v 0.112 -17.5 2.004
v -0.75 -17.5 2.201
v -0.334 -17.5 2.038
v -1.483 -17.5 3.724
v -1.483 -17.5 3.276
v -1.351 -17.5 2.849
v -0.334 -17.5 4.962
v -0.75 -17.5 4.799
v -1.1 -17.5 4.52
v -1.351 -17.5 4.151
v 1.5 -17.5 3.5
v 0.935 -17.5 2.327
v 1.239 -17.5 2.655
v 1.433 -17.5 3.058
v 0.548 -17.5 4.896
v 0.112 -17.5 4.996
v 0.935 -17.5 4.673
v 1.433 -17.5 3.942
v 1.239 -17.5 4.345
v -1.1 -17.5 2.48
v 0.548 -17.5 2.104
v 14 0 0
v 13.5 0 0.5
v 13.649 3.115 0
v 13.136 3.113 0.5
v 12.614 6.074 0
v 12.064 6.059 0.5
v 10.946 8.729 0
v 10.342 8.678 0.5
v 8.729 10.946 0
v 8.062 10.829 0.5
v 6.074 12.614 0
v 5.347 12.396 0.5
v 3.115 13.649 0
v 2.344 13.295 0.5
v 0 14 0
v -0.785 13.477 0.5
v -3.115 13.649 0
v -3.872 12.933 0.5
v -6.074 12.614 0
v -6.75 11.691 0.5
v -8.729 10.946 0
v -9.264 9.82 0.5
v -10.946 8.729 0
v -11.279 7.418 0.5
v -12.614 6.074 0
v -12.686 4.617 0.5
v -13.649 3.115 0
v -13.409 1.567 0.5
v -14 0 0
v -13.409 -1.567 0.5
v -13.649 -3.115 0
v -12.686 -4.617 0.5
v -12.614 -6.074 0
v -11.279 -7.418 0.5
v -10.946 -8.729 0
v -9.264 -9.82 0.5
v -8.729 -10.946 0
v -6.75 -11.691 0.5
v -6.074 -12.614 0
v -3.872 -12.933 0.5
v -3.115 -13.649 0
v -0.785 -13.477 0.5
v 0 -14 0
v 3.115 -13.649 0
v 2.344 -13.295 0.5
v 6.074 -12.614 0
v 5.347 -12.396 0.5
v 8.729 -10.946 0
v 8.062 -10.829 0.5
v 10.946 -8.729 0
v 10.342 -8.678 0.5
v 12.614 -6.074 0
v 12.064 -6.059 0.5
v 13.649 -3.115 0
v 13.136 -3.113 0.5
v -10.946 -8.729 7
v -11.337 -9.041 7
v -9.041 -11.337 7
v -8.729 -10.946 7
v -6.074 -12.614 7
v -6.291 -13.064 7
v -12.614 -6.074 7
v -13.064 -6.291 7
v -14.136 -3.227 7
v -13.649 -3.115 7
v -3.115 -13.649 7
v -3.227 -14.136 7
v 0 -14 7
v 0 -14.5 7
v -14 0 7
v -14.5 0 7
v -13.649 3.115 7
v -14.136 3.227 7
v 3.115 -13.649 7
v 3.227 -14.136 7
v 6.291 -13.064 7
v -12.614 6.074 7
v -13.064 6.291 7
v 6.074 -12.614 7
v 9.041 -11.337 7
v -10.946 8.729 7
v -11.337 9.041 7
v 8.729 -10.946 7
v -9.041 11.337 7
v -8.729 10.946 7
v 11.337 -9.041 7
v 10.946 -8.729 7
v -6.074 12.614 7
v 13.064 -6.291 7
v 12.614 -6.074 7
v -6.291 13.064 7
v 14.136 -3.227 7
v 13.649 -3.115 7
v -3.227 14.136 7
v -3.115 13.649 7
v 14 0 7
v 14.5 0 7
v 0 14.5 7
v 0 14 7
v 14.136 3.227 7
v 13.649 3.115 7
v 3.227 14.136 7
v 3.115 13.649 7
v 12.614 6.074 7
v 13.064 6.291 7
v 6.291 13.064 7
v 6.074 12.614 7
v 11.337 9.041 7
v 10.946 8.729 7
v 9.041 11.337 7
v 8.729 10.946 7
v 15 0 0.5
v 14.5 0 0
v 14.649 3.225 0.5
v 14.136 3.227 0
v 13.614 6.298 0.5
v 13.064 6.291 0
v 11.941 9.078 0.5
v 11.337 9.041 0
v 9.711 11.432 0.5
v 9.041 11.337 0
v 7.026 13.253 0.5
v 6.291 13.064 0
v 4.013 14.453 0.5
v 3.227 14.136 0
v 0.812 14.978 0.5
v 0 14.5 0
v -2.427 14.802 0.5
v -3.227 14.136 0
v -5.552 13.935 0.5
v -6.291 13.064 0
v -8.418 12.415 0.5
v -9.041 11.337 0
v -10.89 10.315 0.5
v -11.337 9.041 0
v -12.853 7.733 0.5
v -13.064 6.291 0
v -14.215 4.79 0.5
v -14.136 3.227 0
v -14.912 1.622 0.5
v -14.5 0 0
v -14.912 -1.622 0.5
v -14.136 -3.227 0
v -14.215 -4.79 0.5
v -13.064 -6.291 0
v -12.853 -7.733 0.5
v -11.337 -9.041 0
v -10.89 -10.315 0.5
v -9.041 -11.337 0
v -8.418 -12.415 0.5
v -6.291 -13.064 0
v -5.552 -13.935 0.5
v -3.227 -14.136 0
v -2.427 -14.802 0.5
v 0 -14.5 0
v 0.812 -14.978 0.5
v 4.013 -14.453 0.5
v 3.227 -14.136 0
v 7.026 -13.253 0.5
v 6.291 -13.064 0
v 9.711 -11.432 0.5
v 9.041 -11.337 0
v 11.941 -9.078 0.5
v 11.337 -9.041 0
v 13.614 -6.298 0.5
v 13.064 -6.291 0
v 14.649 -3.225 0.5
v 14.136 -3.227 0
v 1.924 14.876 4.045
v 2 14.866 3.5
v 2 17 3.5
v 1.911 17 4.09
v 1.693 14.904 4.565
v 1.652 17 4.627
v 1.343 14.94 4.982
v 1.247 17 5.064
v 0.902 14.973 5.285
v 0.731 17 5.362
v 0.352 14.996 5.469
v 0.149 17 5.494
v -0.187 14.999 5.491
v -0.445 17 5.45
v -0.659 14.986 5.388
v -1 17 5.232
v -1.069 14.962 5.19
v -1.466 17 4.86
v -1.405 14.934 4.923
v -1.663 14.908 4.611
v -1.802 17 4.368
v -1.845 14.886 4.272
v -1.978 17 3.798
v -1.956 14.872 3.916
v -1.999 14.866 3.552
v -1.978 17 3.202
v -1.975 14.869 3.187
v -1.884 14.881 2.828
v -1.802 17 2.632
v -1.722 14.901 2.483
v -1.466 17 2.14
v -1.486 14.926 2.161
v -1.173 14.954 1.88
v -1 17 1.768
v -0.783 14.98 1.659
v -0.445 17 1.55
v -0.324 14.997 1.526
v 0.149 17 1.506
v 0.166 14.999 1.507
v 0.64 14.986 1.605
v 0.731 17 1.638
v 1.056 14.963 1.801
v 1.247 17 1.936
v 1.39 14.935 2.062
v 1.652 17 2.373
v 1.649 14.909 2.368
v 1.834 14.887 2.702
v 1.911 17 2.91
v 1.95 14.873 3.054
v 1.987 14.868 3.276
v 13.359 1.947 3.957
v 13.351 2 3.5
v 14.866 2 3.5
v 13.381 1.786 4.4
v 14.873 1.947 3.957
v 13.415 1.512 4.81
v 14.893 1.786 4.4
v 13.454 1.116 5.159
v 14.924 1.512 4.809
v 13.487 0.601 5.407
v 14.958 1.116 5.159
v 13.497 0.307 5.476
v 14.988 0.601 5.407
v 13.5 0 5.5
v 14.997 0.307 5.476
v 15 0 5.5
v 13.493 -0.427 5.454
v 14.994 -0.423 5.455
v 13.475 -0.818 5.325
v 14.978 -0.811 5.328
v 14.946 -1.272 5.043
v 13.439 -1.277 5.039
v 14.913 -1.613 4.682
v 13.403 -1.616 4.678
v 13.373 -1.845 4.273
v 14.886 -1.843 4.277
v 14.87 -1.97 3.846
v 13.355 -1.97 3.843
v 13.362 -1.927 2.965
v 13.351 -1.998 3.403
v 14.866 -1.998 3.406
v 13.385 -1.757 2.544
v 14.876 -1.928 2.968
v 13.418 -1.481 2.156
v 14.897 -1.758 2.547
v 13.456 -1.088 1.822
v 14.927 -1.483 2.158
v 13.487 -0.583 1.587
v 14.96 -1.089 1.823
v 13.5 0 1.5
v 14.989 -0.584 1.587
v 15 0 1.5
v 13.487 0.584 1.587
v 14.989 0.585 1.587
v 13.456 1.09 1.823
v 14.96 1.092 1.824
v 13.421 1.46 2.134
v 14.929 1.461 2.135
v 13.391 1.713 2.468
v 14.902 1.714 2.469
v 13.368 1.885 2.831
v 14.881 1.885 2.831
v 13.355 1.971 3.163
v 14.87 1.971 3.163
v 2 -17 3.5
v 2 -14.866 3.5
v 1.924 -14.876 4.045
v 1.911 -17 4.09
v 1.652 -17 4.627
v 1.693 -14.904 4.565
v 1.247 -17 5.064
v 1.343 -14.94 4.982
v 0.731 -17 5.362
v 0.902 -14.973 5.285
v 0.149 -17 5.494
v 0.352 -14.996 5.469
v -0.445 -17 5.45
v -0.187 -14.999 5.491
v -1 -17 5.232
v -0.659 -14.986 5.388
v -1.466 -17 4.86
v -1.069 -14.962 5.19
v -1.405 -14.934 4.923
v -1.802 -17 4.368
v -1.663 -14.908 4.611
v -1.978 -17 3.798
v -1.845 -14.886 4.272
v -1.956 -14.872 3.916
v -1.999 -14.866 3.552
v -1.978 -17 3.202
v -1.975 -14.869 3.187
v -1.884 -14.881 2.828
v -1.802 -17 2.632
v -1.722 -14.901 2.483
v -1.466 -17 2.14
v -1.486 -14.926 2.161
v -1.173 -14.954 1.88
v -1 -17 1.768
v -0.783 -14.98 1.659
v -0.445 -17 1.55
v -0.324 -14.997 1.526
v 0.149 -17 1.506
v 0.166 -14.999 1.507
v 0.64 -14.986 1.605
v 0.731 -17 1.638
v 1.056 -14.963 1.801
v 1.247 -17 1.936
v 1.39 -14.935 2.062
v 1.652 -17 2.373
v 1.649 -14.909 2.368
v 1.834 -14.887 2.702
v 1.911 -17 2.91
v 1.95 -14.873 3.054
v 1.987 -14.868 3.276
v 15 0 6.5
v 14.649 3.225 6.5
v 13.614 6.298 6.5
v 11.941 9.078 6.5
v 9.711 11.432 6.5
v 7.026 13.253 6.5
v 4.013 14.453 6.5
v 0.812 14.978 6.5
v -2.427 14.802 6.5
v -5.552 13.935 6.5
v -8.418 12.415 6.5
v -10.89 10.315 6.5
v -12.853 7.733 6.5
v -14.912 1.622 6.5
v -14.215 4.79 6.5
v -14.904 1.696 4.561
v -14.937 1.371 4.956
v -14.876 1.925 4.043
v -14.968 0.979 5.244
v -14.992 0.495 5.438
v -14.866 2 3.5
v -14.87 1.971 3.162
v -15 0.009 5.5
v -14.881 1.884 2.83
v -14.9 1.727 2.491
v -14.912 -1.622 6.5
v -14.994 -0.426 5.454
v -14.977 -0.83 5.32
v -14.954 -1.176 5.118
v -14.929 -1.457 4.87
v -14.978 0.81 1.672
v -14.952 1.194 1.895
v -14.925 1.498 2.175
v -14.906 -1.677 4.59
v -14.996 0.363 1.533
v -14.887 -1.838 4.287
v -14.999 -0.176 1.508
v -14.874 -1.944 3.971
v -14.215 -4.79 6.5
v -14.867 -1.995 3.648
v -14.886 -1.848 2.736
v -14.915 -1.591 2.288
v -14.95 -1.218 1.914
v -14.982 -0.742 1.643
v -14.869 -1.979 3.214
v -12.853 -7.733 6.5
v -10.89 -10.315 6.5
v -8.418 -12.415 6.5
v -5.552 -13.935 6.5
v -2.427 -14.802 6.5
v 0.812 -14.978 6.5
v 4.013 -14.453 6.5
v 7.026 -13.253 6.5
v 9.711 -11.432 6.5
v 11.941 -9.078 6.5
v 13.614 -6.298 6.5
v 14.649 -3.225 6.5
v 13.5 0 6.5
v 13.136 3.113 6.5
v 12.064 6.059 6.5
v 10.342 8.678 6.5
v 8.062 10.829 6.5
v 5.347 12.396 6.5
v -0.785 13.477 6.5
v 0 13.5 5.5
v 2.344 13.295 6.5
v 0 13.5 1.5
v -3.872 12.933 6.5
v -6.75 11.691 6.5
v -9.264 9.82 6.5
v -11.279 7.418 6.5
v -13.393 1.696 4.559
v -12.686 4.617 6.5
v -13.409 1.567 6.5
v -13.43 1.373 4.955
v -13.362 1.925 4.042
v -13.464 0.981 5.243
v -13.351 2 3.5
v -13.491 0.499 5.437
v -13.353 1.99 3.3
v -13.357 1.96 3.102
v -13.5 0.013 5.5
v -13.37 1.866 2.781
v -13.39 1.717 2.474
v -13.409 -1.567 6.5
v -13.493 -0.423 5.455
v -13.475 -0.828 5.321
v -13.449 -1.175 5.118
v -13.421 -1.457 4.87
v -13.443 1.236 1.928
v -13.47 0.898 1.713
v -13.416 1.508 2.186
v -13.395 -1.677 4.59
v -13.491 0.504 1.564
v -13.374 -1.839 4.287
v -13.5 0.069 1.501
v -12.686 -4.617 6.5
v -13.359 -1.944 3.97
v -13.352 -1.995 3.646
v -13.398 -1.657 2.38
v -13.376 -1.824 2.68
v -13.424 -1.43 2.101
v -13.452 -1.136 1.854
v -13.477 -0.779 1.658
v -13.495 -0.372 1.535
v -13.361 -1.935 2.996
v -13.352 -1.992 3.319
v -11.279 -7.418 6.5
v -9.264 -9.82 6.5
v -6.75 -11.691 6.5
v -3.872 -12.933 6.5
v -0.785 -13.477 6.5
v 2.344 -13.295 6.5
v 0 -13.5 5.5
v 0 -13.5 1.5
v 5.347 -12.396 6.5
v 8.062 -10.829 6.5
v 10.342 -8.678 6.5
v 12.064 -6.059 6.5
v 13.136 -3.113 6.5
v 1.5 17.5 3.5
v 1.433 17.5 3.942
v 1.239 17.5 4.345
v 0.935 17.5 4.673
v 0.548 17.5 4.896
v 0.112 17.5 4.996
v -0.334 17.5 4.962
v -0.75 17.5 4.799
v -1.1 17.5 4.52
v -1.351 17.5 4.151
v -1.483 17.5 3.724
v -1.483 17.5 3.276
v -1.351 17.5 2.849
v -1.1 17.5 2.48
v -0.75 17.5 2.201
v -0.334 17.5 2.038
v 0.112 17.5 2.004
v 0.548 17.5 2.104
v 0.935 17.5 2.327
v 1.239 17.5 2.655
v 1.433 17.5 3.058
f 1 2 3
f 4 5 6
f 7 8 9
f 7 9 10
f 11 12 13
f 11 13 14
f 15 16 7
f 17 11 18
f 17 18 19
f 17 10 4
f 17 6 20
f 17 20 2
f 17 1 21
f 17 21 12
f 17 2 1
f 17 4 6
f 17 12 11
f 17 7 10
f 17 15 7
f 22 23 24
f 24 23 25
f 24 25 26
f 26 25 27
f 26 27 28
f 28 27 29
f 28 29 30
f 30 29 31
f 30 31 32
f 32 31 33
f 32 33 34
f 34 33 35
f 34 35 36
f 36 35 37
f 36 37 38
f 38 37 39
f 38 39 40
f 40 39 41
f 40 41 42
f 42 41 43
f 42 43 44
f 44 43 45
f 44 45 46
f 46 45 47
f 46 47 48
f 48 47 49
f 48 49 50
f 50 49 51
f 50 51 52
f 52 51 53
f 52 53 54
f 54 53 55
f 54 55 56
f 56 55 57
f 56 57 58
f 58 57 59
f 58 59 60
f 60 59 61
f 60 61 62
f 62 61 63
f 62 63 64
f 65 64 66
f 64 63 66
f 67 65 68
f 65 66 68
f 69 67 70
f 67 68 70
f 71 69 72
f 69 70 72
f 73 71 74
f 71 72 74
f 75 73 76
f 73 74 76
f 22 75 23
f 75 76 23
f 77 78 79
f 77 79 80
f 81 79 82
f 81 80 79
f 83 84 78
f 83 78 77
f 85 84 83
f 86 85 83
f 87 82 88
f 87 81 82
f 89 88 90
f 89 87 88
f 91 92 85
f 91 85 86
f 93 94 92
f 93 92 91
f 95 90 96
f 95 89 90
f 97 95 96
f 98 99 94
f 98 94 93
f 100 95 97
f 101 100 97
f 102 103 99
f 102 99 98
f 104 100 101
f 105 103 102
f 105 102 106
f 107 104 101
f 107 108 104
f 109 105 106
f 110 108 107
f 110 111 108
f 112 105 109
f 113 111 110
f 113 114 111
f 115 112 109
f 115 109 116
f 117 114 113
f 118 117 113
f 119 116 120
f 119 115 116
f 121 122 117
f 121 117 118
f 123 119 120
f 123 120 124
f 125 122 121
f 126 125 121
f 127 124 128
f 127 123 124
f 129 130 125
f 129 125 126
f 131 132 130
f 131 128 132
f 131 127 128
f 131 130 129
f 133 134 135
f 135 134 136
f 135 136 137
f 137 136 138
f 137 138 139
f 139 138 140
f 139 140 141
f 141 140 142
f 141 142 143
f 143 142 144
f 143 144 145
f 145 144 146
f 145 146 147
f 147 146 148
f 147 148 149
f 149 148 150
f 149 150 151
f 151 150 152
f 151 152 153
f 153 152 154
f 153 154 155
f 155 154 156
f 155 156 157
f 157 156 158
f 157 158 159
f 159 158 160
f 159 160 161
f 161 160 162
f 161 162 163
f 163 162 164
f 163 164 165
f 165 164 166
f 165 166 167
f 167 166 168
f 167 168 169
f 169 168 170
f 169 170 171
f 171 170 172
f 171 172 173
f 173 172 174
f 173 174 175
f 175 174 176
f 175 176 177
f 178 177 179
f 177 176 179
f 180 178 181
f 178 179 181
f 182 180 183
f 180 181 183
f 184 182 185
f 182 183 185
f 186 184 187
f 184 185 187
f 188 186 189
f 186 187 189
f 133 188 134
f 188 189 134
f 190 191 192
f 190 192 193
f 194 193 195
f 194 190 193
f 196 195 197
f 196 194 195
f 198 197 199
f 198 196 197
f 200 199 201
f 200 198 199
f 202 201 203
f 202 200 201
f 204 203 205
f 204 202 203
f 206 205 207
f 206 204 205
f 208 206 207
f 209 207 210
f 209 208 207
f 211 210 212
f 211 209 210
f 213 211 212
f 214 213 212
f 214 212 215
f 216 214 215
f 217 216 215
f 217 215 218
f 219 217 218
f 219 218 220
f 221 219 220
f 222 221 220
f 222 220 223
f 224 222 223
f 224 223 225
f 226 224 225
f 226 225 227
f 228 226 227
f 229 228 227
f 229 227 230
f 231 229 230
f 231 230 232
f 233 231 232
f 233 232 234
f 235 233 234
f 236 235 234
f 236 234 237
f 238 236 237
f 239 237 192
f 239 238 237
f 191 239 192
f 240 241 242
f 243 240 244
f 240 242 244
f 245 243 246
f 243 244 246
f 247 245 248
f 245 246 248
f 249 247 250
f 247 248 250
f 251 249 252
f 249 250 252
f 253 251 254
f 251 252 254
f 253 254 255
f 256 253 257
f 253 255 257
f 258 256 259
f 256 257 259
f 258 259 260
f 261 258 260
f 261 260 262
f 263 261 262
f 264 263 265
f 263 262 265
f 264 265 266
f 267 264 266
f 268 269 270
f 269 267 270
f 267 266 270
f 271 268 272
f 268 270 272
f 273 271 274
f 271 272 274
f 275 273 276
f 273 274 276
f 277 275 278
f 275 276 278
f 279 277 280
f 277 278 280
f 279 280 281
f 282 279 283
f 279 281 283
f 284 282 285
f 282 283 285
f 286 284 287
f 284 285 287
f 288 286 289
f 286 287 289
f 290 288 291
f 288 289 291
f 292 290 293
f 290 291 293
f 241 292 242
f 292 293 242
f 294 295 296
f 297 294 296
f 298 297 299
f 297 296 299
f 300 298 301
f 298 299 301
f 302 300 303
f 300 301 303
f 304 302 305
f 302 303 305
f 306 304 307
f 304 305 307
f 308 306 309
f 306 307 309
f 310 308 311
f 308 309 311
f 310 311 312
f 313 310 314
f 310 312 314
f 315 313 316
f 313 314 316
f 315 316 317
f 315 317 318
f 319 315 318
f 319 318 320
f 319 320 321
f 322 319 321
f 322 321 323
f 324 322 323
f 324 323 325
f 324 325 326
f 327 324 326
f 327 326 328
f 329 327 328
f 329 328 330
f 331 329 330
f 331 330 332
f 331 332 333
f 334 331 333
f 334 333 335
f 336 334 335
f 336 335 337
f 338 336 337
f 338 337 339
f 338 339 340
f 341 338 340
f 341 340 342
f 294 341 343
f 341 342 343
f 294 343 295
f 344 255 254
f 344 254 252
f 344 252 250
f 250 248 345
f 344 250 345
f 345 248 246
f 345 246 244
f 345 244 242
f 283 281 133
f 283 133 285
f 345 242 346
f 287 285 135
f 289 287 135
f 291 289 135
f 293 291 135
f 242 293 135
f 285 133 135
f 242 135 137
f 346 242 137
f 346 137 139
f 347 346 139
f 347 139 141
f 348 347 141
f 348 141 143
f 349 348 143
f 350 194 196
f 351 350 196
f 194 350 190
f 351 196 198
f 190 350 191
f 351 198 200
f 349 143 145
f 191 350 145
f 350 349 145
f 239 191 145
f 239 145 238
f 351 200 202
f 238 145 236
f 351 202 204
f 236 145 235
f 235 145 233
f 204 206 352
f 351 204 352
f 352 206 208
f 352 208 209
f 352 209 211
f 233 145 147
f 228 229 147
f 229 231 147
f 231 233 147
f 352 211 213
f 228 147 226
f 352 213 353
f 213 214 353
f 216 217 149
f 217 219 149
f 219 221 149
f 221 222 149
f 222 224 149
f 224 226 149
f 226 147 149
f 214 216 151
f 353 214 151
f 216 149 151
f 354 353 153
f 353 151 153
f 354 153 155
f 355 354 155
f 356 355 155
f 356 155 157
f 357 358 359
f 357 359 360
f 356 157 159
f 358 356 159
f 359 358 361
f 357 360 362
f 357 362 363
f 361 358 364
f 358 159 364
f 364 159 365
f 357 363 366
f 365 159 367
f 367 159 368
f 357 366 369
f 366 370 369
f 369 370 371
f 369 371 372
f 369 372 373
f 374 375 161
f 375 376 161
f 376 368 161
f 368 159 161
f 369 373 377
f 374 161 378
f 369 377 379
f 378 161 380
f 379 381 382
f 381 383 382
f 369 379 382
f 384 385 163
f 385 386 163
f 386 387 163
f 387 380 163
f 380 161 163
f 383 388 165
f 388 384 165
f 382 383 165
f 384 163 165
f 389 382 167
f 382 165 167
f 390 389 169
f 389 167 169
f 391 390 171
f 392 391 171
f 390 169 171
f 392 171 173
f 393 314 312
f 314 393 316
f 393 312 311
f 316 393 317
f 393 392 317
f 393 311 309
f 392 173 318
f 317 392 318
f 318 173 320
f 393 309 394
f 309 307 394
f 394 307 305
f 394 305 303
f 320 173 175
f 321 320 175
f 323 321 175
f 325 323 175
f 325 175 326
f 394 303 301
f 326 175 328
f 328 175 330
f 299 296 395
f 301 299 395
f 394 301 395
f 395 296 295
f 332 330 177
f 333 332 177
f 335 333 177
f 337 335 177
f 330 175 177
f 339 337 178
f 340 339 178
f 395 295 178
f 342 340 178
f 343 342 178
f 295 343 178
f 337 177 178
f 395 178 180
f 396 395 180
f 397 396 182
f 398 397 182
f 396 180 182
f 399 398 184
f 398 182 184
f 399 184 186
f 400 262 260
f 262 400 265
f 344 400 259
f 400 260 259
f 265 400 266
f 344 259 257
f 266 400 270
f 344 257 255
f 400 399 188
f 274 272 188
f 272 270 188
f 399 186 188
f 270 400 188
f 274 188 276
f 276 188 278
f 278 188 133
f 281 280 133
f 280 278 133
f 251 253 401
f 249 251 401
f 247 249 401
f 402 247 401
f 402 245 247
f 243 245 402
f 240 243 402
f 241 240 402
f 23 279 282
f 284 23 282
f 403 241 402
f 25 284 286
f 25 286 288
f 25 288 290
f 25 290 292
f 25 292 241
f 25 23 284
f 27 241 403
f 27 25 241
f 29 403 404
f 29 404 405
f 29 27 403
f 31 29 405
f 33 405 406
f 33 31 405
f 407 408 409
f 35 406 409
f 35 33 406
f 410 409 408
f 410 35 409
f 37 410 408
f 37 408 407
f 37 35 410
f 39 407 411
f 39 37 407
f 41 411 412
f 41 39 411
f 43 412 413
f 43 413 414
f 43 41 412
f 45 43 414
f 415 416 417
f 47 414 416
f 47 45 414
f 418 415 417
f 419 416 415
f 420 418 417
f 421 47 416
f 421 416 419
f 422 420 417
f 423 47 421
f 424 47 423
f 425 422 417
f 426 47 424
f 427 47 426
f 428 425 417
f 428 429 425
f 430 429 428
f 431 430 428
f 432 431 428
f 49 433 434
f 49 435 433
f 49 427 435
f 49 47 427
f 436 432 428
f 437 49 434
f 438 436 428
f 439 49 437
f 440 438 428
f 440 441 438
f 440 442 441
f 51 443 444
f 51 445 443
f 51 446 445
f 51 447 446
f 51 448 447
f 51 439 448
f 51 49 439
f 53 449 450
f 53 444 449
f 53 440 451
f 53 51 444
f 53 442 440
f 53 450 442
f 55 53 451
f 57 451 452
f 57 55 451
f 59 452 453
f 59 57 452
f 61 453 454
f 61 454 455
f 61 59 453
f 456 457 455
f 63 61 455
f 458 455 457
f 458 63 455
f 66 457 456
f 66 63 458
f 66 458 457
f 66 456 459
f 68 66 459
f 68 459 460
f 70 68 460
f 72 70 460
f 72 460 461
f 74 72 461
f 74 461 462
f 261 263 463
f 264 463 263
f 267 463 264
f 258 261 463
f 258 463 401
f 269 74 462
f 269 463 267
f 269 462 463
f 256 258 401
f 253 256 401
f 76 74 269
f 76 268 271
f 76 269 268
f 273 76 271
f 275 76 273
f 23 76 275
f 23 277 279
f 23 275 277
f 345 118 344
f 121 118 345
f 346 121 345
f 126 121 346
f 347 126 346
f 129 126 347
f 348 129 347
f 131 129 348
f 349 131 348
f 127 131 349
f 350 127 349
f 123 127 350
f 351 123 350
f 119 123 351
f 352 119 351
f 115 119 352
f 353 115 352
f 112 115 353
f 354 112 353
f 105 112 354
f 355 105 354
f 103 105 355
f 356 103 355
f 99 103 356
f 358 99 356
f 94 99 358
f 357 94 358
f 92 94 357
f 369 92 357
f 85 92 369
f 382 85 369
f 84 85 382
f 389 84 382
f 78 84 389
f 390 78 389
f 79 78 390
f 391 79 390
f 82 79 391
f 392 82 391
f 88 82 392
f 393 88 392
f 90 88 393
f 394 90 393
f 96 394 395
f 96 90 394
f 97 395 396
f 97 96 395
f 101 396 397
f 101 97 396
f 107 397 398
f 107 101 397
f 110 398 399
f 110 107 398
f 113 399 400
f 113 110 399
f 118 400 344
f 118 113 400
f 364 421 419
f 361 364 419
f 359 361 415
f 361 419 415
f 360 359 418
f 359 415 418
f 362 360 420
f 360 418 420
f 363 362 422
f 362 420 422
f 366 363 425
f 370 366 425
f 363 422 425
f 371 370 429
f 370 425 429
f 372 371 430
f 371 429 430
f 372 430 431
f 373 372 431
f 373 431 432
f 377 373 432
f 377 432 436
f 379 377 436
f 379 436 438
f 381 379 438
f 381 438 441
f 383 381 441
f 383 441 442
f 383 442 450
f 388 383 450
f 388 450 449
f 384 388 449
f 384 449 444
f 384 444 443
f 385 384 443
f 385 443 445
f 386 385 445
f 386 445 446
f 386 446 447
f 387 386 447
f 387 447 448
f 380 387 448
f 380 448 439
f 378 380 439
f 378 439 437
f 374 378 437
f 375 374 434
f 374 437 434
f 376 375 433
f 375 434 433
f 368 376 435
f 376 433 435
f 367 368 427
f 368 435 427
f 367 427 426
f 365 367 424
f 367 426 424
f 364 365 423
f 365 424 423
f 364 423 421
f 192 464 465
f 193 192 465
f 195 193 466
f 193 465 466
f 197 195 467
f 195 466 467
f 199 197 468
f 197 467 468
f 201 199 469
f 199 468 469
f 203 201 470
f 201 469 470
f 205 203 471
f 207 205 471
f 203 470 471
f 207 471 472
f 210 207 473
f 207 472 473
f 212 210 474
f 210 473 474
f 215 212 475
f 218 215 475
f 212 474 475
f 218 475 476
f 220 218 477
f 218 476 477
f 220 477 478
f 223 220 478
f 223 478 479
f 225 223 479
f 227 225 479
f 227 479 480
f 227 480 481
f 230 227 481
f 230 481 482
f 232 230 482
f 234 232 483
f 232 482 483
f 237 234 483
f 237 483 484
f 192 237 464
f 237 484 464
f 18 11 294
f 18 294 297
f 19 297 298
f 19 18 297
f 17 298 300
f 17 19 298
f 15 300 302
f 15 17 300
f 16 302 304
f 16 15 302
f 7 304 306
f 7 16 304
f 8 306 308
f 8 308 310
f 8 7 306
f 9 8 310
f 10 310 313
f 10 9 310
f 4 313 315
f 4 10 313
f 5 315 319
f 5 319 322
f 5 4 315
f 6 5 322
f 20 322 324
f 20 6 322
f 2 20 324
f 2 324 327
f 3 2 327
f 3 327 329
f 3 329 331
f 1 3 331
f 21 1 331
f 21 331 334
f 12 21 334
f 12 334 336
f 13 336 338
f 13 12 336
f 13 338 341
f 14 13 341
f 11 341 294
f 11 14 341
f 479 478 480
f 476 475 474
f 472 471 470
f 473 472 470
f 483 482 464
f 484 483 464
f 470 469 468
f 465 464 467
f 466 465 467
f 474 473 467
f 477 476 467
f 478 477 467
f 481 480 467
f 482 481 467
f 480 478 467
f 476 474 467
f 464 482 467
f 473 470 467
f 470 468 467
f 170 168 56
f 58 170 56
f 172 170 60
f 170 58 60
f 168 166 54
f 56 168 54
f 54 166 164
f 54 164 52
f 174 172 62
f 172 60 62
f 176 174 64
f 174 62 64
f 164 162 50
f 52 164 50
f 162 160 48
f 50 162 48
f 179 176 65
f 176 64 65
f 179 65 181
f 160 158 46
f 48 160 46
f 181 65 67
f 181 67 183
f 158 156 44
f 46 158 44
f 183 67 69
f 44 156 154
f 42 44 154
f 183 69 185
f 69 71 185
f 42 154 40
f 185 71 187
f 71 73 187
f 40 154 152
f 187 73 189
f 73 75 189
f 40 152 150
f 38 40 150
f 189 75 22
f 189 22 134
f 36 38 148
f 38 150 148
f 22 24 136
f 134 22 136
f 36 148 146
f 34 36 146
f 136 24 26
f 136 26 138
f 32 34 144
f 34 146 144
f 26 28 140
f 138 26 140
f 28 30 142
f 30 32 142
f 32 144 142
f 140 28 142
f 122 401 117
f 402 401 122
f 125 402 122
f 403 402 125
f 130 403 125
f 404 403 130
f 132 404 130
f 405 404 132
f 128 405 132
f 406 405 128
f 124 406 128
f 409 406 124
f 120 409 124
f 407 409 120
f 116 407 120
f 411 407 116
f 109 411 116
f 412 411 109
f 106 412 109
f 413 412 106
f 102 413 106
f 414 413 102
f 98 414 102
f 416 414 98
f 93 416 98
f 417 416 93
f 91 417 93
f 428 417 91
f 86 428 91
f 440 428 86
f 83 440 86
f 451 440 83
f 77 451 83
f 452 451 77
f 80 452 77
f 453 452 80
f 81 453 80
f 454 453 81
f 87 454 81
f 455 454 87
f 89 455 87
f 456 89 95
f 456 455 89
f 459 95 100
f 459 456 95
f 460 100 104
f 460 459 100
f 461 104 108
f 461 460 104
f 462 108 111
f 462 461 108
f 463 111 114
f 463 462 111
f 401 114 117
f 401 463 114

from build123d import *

# Parameters (mm, degrees)
F0_R     = 15
F0_R_2   = 13.5
F1_DEPTH = 7
F2_R     = 2
F3_DEPTH = 20
F4_SIZE  = 0.5
F6_R     = 2
F7_DEPTH = 4
F9_SIZE  = 0.5


with BuildPart() as f1:
    # F0 (on Top) → F1 (new body)
    with BuildSketch(Plane.XY):
        Circle(F0_R)
        Circle(F0_R_2, mode=Mode.SUBTRACT)
    extrude(amount=F1_DEPTH)

    # F2 (on Right) → F3 (cut, symmetric)
    with BuildSketch(Plane.YZ):
        with Locations((0, 3.5)):
            Circle(F2_R)
    extrude(amount=F3_DEPTH, both=True, mode=Mode.SUBTRACT)

    # F4
    f4_edges = [f1.edges().sort_by_distance(p)[0] for p in [
        (-15, 0, 7),
        (-13.5, 0, 7),
        (-15, 0, 0),
        (-13.5, 0, 0),
    ]]
    chamfer(f4_edges, length=F4_SIZE)

    # F6 (on offset) → F7 (join)
    with BuildSketch(Plane.XZ.offset(-13.5)):
        with Locations((0, 3.5)):
            Circle(F6_R)
    extrude(amount=-F7_DEPTH)

    # F8: F1 across plane


with BuildPart() as f1_1:
    add(f1.part)
    add(f1.part.mirror(Plane.XZ))

    # F9
    f9_edges = [f1_1.edges().sort_by_distance(p)[0] for p in [
        (-2, 17.5, 3.5),
        (-2, -17.5, 3.5),
    ]]
    chamfer(f9_edges, length=F9_SIZE)


solid = f1_1.part
